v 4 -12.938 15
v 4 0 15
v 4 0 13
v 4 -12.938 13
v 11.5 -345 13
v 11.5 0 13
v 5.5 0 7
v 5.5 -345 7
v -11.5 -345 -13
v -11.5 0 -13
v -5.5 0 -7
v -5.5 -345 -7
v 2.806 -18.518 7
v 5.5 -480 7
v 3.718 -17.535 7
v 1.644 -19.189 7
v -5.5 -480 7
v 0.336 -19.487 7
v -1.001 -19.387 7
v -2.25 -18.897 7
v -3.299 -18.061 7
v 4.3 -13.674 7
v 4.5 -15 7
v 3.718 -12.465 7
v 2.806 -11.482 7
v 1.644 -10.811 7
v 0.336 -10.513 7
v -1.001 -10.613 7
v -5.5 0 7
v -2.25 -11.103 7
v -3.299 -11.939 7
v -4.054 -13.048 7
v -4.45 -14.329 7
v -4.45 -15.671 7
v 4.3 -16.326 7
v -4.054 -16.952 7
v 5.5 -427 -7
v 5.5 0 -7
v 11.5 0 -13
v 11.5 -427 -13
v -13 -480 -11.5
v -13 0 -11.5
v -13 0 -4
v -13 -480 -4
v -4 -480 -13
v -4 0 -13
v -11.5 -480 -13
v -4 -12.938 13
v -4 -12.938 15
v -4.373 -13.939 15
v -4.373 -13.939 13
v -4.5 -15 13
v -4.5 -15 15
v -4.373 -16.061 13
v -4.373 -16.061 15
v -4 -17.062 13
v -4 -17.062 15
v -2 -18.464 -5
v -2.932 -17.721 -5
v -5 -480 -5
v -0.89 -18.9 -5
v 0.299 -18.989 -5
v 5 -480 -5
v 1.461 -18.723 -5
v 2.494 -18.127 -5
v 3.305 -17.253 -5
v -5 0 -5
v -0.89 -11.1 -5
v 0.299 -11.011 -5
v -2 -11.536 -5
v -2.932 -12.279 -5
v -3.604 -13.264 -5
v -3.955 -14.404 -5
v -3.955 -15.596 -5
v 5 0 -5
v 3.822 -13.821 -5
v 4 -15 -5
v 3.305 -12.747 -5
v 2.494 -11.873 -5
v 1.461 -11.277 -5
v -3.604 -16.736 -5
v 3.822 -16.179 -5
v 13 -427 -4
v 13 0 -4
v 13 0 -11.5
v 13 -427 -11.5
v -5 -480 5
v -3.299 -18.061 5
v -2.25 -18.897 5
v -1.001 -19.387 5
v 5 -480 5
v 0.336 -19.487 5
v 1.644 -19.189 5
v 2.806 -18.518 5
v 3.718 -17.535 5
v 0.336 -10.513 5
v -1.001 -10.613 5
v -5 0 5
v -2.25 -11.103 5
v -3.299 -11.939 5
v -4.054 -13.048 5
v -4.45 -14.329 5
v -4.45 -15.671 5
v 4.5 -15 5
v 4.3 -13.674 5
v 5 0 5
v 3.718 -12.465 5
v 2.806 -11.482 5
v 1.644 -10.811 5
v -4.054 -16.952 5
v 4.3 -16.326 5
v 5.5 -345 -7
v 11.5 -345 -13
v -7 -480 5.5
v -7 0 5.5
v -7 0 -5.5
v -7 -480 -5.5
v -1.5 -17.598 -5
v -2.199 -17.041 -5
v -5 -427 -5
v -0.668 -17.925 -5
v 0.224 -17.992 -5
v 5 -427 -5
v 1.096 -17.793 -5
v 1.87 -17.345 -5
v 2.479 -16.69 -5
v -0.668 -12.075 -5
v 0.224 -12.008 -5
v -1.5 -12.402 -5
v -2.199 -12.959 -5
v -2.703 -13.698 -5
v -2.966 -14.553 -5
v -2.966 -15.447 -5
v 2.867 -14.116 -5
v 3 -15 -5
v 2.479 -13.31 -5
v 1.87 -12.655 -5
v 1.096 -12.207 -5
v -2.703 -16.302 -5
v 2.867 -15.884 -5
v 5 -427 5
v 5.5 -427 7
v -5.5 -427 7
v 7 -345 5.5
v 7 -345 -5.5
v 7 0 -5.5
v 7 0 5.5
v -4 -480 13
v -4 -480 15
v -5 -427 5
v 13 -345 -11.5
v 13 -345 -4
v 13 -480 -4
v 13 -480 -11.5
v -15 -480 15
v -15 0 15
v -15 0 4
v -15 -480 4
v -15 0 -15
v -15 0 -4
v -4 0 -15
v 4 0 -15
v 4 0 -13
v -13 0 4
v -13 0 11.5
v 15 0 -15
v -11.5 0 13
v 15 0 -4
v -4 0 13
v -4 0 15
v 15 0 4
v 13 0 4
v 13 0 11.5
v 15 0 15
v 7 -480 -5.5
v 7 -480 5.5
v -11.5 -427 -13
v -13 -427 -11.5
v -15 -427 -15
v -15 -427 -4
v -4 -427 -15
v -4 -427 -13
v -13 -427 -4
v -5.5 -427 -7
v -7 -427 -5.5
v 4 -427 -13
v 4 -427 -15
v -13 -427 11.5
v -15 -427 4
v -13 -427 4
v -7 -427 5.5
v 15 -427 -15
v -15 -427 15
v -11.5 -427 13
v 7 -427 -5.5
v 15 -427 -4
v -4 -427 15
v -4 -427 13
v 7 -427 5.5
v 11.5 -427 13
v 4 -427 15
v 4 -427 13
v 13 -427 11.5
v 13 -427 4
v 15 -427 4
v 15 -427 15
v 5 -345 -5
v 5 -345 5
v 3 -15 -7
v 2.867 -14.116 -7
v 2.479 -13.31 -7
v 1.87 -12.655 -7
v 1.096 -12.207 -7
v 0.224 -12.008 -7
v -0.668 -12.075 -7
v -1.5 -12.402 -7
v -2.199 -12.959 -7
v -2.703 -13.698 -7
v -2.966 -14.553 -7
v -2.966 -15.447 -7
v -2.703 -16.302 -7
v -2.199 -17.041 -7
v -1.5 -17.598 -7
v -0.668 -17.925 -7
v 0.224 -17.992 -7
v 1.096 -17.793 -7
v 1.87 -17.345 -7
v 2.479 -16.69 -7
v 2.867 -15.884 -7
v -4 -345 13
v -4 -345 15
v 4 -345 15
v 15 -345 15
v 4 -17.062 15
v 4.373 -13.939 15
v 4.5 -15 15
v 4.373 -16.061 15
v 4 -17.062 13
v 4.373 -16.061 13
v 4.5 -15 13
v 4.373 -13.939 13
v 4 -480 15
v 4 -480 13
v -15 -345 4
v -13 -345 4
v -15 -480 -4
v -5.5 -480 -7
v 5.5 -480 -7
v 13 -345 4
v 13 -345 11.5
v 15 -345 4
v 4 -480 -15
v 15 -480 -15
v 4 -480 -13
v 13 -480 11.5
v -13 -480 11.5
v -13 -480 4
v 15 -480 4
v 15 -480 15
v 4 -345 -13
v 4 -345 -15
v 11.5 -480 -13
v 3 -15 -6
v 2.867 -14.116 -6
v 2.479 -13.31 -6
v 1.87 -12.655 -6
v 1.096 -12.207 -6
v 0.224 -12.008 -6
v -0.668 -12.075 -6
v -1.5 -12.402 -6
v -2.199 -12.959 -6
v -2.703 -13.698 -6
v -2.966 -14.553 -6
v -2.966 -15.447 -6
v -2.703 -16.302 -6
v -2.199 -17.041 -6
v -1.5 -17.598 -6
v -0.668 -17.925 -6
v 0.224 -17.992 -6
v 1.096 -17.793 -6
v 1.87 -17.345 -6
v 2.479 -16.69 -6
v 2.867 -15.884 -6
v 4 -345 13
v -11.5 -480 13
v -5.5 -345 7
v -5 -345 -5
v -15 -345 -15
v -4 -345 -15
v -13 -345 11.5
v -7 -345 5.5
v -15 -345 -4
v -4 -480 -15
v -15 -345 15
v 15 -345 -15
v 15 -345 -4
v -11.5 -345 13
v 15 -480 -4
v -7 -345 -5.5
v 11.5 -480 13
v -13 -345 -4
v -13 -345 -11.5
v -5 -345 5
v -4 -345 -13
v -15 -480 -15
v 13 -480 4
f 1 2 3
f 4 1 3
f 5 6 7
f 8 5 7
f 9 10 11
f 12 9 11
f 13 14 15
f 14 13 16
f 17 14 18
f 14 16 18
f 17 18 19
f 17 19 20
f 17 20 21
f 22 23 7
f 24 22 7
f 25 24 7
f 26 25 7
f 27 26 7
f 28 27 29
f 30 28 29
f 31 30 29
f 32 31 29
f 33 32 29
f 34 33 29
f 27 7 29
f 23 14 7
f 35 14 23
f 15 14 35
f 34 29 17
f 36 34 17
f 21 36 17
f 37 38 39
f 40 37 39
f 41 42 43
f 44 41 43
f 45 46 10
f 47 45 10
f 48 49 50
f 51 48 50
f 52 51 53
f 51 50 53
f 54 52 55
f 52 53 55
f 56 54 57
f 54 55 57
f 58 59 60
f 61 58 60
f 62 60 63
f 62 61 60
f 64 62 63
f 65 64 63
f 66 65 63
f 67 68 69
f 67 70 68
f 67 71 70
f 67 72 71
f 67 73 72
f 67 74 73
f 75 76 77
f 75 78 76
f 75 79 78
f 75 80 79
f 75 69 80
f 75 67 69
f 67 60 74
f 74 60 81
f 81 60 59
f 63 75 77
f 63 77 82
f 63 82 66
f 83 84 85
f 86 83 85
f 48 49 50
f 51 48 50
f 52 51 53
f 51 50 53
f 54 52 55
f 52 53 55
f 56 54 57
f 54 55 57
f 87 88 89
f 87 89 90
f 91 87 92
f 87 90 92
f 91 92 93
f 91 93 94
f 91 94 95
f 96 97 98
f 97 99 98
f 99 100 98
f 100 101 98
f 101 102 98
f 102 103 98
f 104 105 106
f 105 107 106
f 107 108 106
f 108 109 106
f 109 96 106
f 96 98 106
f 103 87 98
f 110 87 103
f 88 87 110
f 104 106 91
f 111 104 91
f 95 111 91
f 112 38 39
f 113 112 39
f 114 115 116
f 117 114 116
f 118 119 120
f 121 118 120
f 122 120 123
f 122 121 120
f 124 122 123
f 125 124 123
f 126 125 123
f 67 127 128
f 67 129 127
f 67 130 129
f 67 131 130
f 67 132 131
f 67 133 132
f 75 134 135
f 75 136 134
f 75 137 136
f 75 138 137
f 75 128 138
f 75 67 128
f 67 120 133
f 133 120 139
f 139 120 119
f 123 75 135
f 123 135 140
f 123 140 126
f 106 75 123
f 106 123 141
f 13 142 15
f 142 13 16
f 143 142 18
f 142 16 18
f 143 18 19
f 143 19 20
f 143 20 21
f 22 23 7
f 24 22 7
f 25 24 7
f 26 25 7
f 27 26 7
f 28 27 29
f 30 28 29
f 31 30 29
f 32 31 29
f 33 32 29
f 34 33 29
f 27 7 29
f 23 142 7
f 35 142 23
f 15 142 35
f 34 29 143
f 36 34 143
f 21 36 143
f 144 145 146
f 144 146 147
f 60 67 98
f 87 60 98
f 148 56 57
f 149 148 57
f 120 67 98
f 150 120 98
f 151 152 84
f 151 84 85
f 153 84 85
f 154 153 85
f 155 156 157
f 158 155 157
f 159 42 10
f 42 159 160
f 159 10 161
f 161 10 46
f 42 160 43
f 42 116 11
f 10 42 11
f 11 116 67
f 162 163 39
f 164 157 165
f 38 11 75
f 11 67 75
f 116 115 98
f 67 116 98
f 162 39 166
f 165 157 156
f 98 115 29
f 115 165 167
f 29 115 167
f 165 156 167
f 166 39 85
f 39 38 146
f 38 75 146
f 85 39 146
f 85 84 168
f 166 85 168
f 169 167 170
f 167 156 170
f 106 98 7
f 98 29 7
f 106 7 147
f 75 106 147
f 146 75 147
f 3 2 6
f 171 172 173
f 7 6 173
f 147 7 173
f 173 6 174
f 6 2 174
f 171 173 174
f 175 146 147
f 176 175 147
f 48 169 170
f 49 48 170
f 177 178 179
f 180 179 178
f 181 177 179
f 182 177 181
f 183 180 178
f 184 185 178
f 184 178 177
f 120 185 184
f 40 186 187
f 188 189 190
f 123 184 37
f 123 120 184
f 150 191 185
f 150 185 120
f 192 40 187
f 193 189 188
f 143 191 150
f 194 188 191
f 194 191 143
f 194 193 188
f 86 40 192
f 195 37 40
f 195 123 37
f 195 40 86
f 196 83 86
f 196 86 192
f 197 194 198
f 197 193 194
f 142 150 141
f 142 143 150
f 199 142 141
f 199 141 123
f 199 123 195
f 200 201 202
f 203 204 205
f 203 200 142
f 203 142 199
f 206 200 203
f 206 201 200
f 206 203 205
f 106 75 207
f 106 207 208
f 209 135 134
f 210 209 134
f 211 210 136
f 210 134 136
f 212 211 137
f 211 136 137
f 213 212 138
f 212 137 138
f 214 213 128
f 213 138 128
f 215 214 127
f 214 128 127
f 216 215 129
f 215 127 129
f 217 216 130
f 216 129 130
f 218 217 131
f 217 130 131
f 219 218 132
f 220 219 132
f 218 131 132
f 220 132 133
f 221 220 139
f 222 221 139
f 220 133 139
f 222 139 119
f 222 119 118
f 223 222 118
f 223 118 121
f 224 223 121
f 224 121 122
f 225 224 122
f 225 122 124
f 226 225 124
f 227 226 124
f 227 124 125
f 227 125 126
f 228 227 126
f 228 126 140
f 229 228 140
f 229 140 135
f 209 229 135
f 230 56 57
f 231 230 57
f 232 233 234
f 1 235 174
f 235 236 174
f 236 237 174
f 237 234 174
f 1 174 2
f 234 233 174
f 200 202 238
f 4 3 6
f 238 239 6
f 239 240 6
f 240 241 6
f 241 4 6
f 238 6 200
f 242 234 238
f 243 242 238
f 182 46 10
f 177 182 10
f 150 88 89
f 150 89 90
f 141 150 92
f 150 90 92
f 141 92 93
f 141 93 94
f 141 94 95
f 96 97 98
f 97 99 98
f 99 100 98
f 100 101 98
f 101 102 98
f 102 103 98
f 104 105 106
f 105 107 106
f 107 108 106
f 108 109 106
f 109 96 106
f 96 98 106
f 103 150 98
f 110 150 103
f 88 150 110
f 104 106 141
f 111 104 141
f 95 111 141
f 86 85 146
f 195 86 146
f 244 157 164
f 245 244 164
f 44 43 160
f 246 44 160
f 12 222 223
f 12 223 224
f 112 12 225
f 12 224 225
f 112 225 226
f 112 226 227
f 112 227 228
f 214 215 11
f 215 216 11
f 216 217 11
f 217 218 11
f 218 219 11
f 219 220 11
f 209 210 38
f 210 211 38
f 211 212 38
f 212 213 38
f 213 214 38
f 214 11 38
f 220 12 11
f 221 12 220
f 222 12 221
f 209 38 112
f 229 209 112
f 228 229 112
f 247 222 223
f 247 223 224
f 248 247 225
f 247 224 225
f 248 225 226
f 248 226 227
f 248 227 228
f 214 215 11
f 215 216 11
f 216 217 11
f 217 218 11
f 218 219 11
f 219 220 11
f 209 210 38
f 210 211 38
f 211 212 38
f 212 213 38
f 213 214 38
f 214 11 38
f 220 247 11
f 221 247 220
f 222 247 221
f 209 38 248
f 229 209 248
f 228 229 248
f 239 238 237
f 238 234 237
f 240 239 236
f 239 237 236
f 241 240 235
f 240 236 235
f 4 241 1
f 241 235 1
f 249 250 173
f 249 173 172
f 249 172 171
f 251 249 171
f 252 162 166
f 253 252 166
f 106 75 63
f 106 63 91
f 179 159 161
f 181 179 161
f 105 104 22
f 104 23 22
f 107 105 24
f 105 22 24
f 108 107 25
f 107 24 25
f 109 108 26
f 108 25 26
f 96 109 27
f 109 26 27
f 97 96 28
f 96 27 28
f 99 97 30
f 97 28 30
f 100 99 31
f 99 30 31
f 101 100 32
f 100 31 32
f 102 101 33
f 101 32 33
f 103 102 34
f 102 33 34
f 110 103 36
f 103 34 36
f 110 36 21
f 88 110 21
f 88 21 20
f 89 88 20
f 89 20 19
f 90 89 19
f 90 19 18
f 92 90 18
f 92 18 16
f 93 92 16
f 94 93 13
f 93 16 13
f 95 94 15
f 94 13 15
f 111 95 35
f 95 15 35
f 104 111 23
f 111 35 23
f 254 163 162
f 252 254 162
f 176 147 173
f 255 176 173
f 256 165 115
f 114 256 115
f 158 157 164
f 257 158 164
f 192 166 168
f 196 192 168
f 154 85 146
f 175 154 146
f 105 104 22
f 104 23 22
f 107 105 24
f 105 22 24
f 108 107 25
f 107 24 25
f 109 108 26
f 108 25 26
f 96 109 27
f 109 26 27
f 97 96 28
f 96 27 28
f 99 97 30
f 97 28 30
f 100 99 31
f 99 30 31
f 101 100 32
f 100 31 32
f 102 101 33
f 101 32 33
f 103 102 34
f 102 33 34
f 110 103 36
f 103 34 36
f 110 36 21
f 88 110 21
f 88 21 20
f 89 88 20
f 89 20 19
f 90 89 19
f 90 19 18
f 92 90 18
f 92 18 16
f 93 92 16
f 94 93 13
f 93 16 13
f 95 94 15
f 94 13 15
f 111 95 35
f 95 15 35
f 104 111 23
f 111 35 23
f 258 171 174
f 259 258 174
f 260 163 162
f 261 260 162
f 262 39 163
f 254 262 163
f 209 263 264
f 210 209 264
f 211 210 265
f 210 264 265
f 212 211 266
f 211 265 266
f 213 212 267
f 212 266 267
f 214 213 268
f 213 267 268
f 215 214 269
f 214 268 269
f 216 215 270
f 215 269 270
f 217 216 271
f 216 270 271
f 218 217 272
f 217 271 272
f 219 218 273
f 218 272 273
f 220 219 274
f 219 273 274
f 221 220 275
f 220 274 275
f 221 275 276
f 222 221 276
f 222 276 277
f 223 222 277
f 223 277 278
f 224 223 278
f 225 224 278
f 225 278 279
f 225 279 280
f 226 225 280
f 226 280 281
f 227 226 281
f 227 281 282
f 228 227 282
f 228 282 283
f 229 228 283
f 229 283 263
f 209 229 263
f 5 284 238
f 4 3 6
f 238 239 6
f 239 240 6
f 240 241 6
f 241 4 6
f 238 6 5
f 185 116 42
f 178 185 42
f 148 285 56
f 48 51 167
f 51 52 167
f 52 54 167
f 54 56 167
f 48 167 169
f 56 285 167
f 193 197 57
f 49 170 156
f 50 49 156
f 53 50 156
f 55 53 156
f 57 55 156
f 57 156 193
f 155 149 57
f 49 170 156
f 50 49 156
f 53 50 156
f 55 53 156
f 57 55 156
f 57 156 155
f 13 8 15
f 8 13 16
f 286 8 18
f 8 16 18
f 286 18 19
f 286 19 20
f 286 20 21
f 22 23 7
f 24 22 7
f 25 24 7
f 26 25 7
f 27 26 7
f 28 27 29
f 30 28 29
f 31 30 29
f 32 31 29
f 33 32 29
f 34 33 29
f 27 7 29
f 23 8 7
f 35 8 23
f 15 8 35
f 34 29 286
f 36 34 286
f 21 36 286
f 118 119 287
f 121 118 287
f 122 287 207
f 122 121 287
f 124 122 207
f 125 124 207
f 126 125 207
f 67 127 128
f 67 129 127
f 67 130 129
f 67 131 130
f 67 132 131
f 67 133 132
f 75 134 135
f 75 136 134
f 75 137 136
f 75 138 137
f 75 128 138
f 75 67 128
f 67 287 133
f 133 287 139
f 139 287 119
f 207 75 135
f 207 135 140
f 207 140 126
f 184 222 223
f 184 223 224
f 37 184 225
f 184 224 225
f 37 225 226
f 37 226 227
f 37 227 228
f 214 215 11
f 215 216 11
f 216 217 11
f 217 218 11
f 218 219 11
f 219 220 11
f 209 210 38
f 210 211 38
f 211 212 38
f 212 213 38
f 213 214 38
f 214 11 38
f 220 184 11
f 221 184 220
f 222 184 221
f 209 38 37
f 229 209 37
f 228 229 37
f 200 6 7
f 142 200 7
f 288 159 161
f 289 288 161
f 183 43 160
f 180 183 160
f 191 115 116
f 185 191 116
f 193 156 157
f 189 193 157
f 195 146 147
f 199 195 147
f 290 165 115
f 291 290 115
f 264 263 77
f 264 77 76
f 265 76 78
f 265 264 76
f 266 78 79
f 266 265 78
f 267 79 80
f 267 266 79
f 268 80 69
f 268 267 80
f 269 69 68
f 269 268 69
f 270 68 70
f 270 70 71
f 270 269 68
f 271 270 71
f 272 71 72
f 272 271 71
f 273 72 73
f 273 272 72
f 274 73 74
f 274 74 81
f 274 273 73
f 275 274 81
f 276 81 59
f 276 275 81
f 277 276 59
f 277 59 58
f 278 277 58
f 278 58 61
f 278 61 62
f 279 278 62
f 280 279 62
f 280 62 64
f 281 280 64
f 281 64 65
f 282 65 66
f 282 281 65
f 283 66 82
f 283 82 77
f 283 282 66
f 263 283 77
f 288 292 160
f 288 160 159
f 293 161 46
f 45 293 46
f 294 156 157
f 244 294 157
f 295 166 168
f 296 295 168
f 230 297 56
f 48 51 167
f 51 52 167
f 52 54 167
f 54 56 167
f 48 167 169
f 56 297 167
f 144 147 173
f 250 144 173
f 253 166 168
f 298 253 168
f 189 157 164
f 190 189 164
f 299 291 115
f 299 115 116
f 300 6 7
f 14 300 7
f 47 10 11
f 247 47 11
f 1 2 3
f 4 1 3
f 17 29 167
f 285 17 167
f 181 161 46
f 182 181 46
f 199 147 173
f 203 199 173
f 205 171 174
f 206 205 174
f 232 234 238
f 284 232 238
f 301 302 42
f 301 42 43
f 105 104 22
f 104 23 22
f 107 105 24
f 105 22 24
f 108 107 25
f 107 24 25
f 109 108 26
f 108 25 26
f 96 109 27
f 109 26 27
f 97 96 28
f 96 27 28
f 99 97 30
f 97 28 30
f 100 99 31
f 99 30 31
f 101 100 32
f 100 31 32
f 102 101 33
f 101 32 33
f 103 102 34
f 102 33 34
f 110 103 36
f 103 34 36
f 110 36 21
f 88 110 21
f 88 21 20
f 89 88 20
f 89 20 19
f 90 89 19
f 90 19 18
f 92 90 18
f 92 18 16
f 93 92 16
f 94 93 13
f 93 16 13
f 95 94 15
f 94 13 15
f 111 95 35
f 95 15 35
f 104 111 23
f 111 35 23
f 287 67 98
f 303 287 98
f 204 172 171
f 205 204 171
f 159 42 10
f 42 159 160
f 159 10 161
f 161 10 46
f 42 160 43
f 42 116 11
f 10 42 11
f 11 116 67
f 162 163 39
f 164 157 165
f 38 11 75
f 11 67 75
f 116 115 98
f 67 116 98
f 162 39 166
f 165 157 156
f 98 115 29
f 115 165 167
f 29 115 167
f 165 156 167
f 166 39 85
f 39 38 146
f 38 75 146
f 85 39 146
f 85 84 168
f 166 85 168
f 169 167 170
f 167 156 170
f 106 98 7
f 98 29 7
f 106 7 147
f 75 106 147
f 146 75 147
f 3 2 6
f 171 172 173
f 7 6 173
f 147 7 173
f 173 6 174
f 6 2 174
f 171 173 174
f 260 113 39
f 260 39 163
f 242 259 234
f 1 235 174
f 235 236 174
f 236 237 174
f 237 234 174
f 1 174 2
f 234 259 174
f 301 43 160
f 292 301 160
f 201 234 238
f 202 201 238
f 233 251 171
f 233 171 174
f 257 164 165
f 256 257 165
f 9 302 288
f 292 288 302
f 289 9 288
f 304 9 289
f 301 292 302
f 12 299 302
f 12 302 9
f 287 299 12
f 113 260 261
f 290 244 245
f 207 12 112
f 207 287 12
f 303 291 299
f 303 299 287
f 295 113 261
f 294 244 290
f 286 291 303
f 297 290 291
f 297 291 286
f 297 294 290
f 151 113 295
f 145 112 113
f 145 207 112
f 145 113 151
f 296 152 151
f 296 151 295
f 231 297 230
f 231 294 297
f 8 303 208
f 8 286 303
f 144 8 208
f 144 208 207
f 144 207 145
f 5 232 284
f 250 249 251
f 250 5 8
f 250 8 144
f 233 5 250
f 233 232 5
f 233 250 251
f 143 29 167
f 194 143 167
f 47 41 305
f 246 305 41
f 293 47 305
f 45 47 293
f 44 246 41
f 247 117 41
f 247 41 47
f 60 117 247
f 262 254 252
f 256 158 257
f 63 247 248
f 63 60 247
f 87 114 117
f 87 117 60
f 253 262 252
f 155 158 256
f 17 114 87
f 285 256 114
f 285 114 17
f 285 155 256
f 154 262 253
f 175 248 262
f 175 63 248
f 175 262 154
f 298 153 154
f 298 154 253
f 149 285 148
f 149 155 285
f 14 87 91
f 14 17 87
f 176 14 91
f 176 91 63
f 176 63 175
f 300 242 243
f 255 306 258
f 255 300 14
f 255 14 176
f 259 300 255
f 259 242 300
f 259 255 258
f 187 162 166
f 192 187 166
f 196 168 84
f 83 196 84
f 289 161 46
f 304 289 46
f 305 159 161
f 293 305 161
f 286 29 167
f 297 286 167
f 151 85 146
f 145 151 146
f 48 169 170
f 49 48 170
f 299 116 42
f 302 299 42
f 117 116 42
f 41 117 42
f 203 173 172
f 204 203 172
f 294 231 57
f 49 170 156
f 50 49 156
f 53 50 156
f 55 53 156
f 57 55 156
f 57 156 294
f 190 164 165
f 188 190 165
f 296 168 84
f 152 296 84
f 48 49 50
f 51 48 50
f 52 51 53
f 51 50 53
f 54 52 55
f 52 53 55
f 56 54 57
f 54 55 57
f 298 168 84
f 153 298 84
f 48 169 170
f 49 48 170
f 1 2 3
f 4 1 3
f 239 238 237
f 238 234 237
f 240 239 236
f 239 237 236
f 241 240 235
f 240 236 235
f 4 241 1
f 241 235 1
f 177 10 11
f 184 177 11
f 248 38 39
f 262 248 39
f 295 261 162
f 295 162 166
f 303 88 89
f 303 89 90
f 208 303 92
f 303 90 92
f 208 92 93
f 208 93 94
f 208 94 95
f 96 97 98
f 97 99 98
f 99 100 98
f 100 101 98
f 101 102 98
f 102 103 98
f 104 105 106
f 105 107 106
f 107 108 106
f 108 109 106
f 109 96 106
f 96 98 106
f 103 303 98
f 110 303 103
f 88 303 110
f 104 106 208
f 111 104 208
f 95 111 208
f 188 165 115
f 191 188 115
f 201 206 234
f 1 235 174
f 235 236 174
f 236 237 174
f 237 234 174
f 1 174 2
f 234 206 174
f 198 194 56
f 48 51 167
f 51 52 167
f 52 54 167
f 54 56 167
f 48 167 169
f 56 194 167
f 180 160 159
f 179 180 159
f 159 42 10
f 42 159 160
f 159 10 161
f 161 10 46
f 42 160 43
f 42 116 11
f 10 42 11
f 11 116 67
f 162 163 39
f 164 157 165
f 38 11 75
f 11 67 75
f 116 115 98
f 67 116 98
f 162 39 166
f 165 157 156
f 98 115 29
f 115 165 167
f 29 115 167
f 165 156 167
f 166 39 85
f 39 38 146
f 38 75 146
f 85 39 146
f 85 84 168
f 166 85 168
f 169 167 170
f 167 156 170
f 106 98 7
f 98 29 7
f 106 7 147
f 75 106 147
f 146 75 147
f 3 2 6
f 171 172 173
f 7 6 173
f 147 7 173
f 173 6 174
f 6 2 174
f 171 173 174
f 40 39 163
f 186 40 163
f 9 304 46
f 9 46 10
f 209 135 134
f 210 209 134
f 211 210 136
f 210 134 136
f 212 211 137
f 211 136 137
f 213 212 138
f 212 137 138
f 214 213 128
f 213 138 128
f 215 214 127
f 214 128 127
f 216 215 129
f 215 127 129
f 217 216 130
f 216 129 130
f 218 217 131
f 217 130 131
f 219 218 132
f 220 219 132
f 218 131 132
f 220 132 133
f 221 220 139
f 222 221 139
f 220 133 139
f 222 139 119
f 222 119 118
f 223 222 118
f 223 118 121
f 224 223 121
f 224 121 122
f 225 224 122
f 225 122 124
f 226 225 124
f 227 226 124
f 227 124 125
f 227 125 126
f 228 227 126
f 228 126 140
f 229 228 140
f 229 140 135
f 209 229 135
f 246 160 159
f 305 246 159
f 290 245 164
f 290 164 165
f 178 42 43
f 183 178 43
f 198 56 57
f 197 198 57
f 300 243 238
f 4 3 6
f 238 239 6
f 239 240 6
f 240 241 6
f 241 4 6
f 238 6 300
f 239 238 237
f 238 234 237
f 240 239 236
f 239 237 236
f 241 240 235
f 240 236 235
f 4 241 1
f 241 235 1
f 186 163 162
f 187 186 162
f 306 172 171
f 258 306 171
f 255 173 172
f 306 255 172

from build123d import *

# Parameters (mm, degrees)
F0_W          = 10
F0_H          = 10
F1_DEPTH      = 480
F2_DEPTH      = 427
F3_DEPTH      = 345
F4_R          = 3
F5_DEPTH      = 22.001
F6_R          = 4.5
F6_R_2        = 3
F7_DEPTH      = 25
F7_DEPTH_BACK = 3
F8_SIZE       = 1


with BuildPart() as f1:
    # F0 (on Front) → F1 (new body)
    with BuildSketch(Plane.XZ):
        Polygon((-4, 15), (-15, 15), (-15, 4), (-13, 4), (-13, 11.5), (-7, 5.5), (-7, -5.5), (-13, -11.5), (-13, -4), (-15, -4), (-15, -15), (-4, -15), (-4, -13), (-11.5, -13), (-5.5, -7), (5.5, -7), (11.5, -13), (4, -13), (4, -15), (15, -15), (15, -4), (13, -4), (13, -11.5), (7, -5.5), (7, 5.5), (13, 11.5), (13, 4), (15, 4), (15, 15), (4, 15), (4, 13), (11.5, 13), (5.5, 7), (-5.5, 7), (-11.5, 13), (-4, 13), align=None)
        Rectangle(F0_W, F0_H, mode=Mode.SUBTRACT)
    extrude(amount=F1_DEPTH)


with BuildPart() as f2:
    # F0 (on Front) → F2 (new body)
    with BuildSketch(Plane.XZ):
        Polygon((-4, 15), (-15, 15), (-15, 4), (-13, 4), (-13, 11.5), (-7, 5.5), (-7, -5.5), (-13, -11.5), (-13, -4), (-15, -4), (-15, -15), (-4, -15), (-4, -13), (-11.5, -13), (-5.5, -7), (5.5, -7), (11.5, -13), (4, -13), (4, -15), (15, -15), (15, -4), (13, -4), (13, -11.5), (7, -5.5), (7, 5.5), (13, 11.5), (13, 4), (15, 4), (15, 15), (4, 15), (4, 13), (11.5, 13), (5.5, 7), (-5.5, 7), (-11.5, 13), (-4, 13), align=None)
        Rectangle(F0_W, F0_H, mode=Mode.SUBTRACT)
    extrude(amount=F2_DEPTH)


with BuildPart() as f3:
    # F0 (on Front) → F3 (new body)
    with BuildSketch(Plane.XZ):
        Polygon((-4, 15), (-15, 15), (-15, 4), (-13, 4), (-13, 11.5), (-7, 5.5), (-7, -5.5), (-13, -11.5), (-13, -4), (-15, -4), (-15, -15), (-4, -15), (-4, -13), (-11.5, -13), (-5.5, -7), (5.5, -7), (11.5, -13), (4, -13), (4, -15), (15, -15), (15, -4), (13, -4), (13, -11.5), (7, -5.5), (7, 5.5), (13, 11.5), (13, 4), (15, 4), (15, 15), (4, 15), (4, 13), (11.5, 13), (5.5, 7), (-5.5, 7), (-11.5, 13), (-4, 13), align=None)
        Rectangle(F0_W, F0_H, mode=Mode.SUBTRACT)
    extrude(amount=F3_DEPTH)


with BuildPart() as f5_tool:
    # F4 (on face) → F5 (new body, through all)
    with BuildSketch(Plane.XY.offset(7)):
        with Locations((0, -15)):
            Circle(F4_R)
    extrude(amount=-F5_DEPTH)


with BuildPart() as f1_1:
    add(f1.part)

    # F5: cut by f5_tool
    add(f5_tool.part, mode=Mode.SUBTRACT)


with BuildPart() as f2_1:
    add(f2.part)

    # F5: cut by f5_tool
    add(f5_tool.part, mode=Mode.SUBTRACT)


with BuildPart() as f3_1:
    add(f3.part)

    # F5: cut by f5_tool
    add(f5_tool.part, mode=Mode.SUBTRACT)


with BuildPart() as f7_tool:
    # F6 (on face) → F7 (new body, two sides)
    with BuildSketch(Plane.XY.offset(7)) as f7_sk:
        with Locations((0, -15)):
            Circle(F6_R)
        with Locations((0, -15)):
            Circle(F6_R_2, mode=Mode.SUBTRACT)
    extrude(amount=F7_DEPTH)
    extrude(f7_sk.sketch, amount=-F7_DEPTH_BACK)


with BuildPart() as f1_2:
    add(f1_1.part)

    # F7: cut by f7_tool
    add(f7_tool.part, mode=Mode.SUBTRACT)

    # F8
    f8_edges = [f1_2.edges().sort_by_distance(p)[0] for p in [
        (-3, -15, -5),
    ]]
    chamfer(f8_edges, length=F8_SIZE)


with BuildPart() as f2_2:
    add(f2_1.part)

    # F7: cut by f7_tool
    add(f7_tool.part, mode=Mode.SUBTRACT)


with BuildPart() as f3_2:
    add(f3_1.part)

    # F7: cut by f7_tool
    add(f7_tool.part, mode=Mode.SUBTRACT)


solid = Compound([f1_2.part, f2_2.part, f3_2.part])
